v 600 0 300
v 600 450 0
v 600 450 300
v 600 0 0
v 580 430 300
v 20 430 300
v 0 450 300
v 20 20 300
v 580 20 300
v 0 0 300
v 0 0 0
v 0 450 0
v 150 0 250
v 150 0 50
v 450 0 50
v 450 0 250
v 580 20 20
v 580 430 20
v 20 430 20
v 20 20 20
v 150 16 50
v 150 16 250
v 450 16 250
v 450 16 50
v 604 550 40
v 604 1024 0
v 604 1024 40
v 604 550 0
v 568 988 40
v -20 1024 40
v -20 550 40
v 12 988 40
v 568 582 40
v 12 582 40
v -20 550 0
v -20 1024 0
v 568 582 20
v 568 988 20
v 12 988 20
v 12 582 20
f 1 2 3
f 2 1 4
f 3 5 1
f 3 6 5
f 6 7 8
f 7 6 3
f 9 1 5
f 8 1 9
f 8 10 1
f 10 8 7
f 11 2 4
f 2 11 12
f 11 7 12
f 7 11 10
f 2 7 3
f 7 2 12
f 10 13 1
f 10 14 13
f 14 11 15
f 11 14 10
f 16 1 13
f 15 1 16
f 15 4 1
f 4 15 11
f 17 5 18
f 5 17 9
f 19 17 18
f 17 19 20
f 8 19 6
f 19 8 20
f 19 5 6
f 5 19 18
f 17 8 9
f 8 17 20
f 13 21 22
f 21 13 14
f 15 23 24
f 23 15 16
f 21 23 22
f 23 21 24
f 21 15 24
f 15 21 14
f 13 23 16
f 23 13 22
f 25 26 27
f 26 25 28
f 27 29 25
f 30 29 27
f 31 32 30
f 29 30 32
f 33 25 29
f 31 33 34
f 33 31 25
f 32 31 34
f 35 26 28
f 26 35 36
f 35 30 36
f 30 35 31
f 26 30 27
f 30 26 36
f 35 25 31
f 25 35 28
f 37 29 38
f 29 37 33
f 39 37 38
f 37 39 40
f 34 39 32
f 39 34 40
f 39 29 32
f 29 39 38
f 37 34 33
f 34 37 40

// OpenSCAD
$fn = 20;

//scale=.2;
scale=1;
length=600*scale;
width=450*scale;
height=300*scale;
thickness=20*scale;
panel_length=300*scale;
panel_height=200*scale;
space=4*scale;
space_offset=8*scale;
hoffset=100*scale;
lid_height=40*scale;

module rounded_box(x,y,z,r){
    translate([r,r,r])
    minkowski(){
        cube([x-r*2,y-r*2,z-r*2]);
        sphere(r=r, $fs=0.1);
    }
}

difference()
{
    cube([length, width, height]);
    translate([thickness, thickness, thickness]) cube([length - thickness*2, width - thickness*2, height - thickness+10]);
    translate([(length-panel_length)/2, thickness/1.25, (height-panel_height)/2]) rotate([90, 0, 0]) cube([panel_length, panel_height, thickness*2]);
}

difference()
{
    translate([-thickness, width+hoffset, 0]) cube([length+thickness+space, width+thickness+space, lid_height]);
    translate([space+space_offset, width+hoffset+thickness+space+space_offset, thickness]) cube([length-thickness*2-space, width-thickness*2-space, lid_height]);
}
